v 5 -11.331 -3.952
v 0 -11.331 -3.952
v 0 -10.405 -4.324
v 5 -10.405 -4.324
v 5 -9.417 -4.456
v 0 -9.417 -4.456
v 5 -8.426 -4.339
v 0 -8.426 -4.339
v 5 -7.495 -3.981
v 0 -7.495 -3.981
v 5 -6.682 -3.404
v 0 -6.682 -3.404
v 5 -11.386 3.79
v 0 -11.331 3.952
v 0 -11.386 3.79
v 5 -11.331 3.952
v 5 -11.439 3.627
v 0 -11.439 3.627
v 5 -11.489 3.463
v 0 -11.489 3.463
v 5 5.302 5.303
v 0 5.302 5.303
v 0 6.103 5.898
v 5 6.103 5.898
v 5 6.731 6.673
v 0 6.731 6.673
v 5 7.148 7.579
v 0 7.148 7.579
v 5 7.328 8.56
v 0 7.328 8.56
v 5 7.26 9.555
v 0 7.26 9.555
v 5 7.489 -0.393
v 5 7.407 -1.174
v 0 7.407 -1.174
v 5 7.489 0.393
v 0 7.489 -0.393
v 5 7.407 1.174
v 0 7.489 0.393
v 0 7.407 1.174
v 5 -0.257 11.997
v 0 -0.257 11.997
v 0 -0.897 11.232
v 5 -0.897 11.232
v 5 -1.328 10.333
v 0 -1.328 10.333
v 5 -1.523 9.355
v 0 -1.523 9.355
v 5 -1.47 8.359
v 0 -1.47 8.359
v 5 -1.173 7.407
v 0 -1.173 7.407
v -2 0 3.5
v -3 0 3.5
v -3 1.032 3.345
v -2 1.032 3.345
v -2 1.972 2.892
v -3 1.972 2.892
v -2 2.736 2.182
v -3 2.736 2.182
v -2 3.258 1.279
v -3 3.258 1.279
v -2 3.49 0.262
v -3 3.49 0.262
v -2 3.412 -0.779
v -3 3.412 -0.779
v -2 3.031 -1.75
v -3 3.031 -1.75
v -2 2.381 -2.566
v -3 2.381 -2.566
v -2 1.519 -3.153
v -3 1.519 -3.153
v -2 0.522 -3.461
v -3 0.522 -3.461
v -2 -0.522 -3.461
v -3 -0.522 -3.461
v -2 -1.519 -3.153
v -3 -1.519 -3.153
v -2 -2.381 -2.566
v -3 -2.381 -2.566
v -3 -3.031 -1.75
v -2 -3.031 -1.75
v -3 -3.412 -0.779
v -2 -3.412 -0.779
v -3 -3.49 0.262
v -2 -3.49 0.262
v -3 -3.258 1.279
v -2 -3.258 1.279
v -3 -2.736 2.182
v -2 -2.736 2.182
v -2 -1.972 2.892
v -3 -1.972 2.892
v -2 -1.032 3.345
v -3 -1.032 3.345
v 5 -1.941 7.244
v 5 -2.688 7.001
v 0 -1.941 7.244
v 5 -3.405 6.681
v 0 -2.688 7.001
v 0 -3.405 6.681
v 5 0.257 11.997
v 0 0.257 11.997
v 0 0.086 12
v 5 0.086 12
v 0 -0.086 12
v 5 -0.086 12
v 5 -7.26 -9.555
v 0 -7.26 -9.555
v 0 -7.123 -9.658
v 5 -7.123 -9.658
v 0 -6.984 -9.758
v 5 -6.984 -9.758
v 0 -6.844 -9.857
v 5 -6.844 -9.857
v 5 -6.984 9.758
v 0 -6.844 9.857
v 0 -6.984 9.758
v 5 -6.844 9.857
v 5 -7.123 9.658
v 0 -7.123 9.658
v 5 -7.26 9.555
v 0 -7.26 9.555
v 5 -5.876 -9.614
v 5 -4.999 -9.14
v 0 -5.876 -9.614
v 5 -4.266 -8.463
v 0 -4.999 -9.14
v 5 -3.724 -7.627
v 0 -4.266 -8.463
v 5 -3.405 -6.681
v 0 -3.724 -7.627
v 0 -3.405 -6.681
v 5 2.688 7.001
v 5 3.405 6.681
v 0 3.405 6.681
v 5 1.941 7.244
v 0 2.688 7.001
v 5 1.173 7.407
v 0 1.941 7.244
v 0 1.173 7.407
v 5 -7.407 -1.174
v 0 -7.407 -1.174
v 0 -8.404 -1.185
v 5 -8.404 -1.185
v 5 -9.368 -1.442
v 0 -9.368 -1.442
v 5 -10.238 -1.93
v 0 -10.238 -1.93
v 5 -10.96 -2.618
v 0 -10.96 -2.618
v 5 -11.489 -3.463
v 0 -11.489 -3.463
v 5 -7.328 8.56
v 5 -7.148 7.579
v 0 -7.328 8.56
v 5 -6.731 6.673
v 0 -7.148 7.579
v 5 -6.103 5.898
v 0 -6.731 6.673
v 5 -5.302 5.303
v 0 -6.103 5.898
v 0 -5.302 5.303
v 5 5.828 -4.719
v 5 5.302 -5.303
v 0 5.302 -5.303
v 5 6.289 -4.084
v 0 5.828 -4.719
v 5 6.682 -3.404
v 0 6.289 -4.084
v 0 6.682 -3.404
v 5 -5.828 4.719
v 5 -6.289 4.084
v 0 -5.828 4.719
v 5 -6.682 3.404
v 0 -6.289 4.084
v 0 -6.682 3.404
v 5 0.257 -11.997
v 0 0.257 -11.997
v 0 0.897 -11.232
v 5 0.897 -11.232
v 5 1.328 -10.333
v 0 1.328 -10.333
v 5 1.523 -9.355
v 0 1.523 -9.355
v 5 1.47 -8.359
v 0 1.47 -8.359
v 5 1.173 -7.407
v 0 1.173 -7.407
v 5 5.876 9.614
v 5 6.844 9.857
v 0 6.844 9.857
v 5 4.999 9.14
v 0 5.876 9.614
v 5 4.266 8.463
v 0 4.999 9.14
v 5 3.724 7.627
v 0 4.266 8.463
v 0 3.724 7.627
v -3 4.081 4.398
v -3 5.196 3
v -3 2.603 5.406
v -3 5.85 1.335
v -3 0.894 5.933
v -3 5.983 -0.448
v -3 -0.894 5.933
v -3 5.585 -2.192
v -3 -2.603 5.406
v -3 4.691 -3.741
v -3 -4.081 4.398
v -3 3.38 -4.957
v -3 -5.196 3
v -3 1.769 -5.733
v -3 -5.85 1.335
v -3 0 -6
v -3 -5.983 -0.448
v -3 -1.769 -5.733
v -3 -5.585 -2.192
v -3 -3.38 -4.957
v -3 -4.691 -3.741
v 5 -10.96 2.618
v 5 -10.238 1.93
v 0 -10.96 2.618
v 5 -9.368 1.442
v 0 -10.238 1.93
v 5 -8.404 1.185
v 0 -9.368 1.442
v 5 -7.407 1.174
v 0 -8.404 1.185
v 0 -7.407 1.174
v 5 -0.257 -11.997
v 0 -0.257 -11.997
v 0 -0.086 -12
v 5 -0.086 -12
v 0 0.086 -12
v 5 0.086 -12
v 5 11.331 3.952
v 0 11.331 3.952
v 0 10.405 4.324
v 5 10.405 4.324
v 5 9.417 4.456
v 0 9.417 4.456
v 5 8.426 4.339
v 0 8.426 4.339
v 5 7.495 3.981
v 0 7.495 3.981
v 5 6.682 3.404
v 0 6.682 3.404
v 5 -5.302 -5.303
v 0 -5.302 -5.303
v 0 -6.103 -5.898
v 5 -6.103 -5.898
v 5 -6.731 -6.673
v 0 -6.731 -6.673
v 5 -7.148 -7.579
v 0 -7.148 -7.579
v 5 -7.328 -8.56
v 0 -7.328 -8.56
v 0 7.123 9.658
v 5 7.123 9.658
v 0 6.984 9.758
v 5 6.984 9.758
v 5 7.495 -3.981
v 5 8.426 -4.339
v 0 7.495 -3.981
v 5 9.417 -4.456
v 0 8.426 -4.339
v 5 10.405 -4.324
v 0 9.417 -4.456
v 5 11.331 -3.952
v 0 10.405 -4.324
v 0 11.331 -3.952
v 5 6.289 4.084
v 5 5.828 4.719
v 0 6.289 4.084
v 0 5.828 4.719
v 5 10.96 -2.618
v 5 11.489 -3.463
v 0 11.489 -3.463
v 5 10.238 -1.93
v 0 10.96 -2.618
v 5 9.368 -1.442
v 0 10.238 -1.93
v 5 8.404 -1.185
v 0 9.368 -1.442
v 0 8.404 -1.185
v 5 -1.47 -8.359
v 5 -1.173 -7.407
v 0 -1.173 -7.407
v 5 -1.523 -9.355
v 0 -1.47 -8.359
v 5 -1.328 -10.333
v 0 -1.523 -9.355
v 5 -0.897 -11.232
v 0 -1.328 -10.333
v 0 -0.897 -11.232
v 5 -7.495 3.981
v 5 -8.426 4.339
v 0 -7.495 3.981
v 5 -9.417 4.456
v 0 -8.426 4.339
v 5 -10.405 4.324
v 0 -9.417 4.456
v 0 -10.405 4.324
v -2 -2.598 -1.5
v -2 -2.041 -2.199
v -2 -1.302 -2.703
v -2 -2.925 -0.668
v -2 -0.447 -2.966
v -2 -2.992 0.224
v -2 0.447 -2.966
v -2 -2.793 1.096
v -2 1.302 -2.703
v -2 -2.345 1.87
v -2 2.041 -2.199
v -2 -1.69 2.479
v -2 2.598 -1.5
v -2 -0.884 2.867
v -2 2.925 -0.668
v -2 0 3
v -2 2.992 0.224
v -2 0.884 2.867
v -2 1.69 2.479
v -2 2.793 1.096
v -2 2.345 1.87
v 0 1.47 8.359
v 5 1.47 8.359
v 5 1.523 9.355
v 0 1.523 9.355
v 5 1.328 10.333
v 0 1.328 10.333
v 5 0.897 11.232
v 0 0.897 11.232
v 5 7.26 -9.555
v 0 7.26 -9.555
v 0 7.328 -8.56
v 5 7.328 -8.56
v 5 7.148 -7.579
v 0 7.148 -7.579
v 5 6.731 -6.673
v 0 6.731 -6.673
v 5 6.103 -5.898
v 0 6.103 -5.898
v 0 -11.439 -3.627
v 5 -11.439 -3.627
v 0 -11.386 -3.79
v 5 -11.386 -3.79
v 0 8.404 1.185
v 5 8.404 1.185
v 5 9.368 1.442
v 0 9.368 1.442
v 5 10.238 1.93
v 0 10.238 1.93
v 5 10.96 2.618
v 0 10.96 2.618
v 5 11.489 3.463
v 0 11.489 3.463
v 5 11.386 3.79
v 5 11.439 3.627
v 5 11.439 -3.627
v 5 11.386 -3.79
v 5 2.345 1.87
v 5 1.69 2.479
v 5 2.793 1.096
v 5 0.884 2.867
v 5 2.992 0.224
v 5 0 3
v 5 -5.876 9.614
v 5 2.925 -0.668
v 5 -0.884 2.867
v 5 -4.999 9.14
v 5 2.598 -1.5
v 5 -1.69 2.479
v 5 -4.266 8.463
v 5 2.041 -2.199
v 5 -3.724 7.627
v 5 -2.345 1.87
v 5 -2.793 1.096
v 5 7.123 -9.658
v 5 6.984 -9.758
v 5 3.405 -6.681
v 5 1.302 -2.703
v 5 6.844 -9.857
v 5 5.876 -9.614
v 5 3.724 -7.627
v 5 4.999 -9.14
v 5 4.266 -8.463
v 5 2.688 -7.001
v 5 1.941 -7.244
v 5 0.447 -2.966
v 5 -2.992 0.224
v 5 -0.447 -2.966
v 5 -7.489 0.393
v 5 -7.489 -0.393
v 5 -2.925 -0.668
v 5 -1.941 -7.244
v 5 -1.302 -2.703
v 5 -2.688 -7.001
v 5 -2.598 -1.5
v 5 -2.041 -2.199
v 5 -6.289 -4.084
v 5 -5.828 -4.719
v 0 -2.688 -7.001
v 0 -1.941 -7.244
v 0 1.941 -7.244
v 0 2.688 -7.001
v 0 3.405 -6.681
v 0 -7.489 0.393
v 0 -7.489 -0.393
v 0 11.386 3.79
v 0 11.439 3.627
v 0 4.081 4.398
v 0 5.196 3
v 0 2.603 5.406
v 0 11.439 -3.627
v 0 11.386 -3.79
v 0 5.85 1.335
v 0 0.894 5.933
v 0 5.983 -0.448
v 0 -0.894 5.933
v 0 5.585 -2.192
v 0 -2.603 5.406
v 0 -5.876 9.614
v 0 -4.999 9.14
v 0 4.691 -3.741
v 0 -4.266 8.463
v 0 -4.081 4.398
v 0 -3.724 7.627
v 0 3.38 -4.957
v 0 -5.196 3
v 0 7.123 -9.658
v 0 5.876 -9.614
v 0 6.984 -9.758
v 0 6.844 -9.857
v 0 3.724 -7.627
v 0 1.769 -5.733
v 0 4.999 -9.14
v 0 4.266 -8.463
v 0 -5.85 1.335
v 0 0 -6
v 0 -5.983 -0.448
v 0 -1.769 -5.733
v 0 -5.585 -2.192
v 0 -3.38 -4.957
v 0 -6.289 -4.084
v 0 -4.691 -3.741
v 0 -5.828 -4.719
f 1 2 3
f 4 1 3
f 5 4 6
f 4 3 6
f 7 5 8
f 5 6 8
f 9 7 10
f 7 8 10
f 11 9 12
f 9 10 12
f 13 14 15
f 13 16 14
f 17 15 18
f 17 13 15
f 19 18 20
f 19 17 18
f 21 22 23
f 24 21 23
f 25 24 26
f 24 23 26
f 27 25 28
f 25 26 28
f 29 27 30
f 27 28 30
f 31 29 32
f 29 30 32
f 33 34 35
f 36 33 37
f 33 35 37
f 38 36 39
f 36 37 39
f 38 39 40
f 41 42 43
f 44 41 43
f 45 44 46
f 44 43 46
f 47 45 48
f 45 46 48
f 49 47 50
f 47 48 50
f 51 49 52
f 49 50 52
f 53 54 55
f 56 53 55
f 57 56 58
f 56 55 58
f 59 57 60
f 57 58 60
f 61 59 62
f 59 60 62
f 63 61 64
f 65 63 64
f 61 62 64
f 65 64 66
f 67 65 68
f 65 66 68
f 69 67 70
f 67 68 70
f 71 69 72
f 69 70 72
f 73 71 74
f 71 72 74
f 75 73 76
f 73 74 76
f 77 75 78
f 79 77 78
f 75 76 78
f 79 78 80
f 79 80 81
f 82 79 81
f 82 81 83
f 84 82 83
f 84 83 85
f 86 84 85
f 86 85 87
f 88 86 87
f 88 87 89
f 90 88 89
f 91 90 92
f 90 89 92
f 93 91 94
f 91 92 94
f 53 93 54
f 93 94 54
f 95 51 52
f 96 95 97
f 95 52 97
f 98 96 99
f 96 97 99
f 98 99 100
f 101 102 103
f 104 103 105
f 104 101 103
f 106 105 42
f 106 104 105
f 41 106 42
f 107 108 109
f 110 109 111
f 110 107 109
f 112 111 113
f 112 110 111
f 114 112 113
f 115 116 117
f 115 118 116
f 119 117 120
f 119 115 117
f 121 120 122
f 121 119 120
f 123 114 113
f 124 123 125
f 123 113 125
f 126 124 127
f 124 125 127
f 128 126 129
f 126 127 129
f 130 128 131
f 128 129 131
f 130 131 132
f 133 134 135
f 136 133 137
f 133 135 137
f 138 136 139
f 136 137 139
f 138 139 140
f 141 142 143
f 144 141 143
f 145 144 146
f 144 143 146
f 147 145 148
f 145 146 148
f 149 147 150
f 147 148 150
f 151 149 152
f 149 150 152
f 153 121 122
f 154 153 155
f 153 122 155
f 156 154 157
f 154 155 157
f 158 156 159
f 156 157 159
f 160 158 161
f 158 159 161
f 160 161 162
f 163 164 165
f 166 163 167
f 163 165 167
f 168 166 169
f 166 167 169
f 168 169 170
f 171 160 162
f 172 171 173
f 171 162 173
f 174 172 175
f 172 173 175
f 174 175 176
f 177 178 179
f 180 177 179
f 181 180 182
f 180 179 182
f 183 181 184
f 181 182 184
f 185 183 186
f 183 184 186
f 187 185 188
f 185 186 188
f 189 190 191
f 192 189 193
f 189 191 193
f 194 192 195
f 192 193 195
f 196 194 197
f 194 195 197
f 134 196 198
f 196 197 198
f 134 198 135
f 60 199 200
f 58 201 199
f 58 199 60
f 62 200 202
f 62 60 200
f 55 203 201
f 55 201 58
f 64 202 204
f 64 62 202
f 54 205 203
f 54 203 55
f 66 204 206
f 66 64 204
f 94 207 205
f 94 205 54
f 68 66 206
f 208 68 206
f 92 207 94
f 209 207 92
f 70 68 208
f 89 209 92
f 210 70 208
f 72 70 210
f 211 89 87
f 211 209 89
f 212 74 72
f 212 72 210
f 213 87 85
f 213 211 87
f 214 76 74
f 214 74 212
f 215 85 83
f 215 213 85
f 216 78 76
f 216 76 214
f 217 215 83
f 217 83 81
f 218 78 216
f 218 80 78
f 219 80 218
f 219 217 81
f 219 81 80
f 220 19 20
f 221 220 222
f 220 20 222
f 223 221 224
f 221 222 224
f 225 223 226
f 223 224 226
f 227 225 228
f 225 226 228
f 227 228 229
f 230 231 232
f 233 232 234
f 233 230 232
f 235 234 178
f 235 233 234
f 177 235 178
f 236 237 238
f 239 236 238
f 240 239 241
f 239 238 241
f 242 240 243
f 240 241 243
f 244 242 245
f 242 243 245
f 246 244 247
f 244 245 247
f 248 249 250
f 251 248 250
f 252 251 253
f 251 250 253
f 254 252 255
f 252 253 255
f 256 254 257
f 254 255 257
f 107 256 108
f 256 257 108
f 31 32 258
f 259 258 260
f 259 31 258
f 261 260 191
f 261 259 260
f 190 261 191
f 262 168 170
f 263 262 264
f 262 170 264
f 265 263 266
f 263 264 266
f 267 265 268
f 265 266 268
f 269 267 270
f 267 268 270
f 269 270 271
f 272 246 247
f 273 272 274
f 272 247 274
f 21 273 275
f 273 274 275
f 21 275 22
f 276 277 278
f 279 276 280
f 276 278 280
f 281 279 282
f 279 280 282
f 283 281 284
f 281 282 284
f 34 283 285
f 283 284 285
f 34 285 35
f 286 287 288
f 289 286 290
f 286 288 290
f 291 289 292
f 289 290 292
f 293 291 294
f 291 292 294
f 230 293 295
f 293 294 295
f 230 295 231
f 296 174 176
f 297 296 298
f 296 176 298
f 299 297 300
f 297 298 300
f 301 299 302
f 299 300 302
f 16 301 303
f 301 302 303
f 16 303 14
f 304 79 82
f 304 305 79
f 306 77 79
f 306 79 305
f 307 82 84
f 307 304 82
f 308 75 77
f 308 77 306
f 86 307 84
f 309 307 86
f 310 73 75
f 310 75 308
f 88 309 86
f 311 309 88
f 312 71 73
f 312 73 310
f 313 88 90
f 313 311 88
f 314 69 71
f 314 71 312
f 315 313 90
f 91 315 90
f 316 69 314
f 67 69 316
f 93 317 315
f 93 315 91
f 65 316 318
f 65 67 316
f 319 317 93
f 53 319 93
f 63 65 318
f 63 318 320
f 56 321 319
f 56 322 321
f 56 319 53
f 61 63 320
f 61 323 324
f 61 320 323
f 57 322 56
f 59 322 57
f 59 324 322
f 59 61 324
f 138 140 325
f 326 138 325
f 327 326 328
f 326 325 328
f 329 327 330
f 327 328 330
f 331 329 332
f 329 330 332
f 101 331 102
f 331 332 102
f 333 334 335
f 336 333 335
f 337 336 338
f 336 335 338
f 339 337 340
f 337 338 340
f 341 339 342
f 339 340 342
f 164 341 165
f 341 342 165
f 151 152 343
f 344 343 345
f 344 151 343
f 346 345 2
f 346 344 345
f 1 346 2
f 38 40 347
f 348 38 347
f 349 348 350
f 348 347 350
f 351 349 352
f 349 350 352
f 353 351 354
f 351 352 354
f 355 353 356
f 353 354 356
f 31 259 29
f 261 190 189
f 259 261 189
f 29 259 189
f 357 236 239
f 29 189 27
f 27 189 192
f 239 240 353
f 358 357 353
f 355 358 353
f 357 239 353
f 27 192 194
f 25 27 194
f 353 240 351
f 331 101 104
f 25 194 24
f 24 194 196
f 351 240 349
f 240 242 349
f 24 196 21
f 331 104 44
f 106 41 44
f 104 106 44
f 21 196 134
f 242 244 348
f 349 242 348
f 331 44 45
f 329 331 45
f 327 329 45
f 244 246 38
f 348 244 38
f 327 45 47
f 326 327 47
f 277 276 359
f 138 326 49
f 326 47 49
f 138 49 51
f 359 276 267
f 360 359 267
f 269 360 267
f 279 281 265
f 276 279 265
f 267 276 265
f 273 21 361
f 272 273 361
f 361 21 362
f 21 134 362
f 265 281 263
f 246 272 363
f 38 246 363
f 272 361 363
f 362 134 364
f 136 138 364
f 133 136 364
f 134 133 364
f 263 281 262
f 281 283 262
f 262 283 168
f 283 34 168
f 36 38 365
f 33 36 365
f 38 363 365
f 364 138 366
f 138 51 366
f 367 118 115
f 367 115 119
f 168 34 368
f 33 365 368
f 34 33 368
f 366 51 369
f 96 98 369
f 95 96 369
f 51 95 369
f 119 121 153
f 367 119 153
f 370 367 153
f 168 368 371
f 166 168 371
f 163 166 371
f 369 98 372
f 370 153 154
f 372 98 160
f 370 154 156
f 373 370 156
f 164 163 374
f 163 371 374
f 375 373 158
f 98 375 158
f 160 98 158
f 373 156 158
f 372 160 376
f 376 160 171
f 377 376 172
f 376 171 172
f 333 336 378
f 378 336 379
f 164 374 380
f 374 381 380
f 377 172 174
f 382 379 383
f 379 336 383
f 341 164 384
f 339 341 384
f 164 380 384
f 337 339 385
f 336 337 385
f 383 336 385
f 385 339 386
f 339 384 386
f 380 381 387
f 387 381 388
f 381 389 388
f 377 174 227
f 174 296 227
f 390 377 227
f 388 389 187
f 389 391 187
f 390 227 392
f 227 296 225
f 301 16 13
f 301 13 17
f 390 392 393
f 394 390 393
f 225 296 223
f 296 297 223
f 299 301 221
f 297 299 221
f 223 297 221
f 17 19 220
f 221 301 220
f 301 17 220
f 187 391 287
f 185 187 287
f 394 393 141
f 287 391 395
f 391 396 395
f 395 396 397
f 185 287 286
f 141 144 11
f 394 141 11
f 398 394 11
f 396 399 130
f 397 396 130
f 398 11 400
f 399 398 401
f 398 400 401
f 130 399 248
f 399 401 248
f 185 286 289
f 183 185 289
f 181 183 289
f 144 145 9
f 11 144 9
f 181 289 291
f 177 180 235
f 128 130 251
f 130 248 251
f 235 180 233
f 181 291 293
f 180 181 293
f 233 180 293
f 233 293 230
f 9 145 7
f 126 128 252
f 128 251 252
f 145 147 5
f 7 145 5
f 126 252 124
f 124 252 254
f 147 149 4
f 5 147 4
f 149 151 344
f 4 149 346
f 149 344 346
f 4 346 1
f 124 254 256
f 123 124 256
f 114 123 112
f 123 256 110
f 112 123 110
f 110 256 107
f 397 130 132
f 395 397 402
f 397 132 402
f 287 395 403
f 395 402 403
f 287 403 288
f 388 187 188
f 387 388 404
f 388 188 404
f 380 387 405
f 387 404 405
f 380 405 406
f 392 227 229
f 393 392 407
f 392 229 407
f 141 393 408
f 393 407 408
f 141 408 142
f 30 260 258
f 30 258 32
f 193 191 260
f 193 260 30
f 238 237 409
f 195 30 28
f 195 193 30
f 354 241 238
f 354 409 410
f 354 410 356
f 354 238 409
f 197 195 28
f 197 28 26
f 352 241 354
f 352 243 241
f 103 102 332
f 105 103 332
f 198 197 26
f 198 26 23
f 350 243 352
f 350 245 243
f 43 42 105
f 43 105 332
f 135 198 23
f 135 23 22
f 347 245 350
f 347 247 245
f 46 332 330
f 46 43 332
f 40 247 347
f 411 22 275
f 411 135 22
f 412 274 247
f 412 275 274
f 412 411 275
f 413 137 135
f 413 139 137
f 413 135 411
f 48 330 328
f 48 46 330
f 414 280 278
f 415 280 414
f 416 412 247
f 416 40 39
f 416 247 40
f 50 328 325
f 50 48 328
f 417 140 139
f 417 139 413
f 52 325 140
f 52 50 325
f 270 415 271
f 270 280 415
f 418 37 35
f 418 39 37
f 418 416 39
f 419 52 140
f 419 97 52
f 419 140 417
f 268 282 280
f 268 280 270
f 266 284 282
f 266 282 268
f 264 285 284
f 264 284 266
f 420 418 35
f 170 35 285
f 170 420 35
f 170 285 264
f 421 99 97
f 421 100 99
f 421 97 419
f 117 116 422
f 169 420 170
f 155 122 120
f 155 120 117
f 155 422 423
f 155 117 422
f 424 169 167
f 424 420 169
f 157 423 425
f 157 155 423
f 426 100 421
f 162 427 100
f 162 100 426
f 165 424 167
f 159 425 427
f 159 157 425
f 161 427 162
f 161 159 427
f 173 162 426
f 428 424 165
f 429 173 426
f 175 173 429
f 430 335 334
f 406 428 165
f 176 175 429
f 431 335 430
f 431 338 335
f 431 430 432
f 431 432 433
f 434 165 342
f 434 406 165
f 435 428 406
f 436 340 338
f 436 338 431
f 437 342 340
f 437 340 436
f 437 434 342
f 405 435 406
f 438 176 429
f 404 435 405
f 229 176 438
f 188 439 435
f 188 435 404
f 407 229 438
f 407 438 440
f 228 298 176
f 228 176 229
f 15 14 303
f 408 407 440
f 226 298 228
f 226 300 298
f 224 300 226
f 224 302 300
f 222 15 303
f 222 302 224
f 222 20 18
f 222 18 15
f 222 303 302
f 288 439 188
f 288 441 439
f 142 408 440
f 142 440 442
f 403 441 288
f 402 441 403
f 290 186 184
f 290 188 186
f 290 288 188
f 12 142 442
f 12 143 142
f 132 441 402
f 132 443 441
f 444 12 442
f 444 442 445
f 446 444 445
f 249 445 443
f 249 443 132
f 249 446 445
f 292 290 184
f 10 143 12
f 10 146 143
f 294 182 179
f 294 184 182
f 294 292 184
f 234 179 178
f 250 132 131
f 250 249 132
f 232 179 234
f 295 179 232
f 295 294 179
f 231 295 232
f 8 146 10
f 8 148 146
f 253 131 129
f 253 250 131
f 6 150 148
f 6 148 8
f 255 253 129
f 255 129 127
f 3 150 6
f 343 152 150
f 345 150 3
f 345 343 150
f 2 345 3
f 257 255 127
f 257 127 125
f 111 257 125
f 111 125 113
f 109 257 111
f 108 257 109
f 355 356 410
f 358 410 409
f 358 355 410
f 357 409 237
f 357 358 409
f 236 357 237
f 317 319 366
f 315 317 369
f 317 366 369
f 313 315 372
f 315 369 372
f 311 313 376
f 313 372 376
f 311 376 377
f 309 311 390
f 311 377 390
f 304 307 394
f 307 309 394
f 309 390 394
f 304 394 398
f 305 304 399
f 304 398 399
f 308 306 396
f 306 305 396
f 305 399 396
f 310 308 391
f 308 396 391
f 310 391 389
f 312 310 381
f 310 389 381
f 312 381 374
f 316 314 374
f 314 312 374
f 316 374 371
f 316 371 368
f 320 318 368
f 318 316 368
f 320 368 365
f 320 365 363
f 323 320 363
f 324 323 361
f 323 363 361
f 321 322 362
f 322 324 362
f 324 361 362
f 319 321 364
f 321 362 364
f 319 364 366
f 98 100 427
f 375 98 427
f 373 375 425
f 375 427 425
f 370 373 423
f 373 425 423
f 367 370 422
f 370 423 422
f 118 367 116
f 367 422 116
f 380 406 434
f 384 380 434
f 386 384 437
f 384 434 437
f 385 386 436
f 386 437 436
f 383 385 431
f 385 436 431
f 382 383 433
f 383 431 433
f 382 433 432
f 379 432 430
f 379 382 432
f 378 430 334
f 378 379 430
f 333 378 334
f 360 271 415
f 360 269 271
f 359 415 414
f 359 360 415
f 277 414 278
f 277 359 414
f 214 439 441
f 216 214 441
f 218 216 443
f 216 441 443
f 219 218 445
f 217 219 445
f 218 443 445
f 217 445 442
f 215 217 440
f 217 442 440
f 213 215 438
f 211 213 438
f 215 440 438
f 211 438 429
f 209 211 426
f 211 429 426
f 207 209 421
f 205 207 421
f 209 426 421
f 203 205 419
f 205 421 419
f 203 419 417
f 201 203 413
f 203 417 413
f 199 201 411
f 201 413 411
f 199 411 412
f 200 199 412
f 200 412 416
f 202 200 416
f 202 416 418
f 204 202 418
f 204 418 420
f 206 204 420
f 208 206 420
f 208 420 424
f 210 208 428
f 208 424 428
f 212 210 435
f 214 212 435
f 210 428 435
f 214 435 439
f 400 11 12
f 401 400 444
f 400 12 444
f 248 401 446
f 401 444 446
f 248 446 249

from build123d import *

# Parameters (mm, degrees)
BASPROSKE_W        = 5
BASPROSKE_H        = 12
TOOTHCUT_DEPTH     = 18.691806013
TEETHCUTS_COUNT    = 10
TEETHCUTS_ANGLE    = 324
HUBNEAONESKE_R     = 6
HUBNEARONE_DEPTH   = 3.0000508
BORSKE_R           = 3
BORE_DEPTH         = 8.0000508
SKETCH1_R          = 3.5
SKETCH1_R_2        = 3
CUT_EXTRUDE1_DEPTH = 1


with BuildPart() as part:
    # BasProSke → Base-Revolve (revolve)
    with BuildSketch(Plane(origin=(0, 0, 0), x_dir=(1, 0, 0), z_dir=(0, 1, 0)), mode=Mode.PRIVATE) as base_revolve_sk:
        with Locations((2.5, 6)):
            Rectangle(BASPROSKE_W, BASPROSKE_H)
    revolve(base_revolve_sk.sketch.rotate(Axis((-10, 0, 0), (1, 0, 0)), 180), axis=Axis((-10, 0, 0), (1, 0, 0)))

    # TooCutSke → ToothCut (cut, through all)
    with BuildSketch(Plane(origin=(0, 0, 0), x_dir=(0, 0, -1), z_dir=(1, 0, 0))):
        with BuildLine():
            ThreePointArc((1.173662691, 7.406586048), (0, 7.499), (-1.173662691, 7.406586048))
            ThreePointArc((-1.173662691, 7.406586048), (-1.668191438, 9.834565786), (-3.497907776, 11.50542856))
            ThreePointArc((-3.497907776, 11.50542856), (0, 12.0254), (3.497907776, 11.50542856))
            ThreePointArc((3.497907776, 11.50542856), (1.668191438, 9.834565786), (1.173662691, 7.406586048))
        make_face()
    toothcut = extrude(amount=TOOTHCUT_DEPTH, mode=Mode.SUBTRACT)

    # TeethCuts: ToothCut ×10 about axis
    teethcuts_axis = Axis((-10, 0, 0), (1, 0, 0))
    for i in range(1, TEETHCUTS_COUNT):
        add(toothcut.rotate(teethcuts_axis, i * TEETHCUTS_ANGLE / (TEETHCUTS_COUNT - 1)), mode=Mode.SUBTRACT)

    # HubNeaOneSke → HubNearOne (add)
    with BuildSketch(Plane.ZY):
        with Locations(Location((0, 0, 0), (0, 0, 180))):
            Circle(HUBNEAONESKE_R)
    extrude(amount=HUBNEARONE_DEPTH)

    # BorSke → Bore (cut, symmetric)
    with BuildSketch(Plane(origin=(0, 0, 0), x_dir=(0, 0, -1), z_dir=(1, 0, 0))):
        with Locations(Location((0, 0, 0), (0, 0, 180))):
            Circle(BORSKE_R)
    extrude(amount=BORE_DEPTH, both=True, mode=Mode.SUBTRACT)

    # Sketch1 → Cut-Extrude1 (cut)
    with BuildSketch(Plane.ZY.offset(3.0000508)):
        Circle(SKETCH1_R)
        Circle(SKETCH1_R_2, mode=Mode.SUBTRACT)
    extrude(amount=-CUT_EXTRUDE1_DEPTH, mode=Mode.SUBTRACT)


solid = part.part
